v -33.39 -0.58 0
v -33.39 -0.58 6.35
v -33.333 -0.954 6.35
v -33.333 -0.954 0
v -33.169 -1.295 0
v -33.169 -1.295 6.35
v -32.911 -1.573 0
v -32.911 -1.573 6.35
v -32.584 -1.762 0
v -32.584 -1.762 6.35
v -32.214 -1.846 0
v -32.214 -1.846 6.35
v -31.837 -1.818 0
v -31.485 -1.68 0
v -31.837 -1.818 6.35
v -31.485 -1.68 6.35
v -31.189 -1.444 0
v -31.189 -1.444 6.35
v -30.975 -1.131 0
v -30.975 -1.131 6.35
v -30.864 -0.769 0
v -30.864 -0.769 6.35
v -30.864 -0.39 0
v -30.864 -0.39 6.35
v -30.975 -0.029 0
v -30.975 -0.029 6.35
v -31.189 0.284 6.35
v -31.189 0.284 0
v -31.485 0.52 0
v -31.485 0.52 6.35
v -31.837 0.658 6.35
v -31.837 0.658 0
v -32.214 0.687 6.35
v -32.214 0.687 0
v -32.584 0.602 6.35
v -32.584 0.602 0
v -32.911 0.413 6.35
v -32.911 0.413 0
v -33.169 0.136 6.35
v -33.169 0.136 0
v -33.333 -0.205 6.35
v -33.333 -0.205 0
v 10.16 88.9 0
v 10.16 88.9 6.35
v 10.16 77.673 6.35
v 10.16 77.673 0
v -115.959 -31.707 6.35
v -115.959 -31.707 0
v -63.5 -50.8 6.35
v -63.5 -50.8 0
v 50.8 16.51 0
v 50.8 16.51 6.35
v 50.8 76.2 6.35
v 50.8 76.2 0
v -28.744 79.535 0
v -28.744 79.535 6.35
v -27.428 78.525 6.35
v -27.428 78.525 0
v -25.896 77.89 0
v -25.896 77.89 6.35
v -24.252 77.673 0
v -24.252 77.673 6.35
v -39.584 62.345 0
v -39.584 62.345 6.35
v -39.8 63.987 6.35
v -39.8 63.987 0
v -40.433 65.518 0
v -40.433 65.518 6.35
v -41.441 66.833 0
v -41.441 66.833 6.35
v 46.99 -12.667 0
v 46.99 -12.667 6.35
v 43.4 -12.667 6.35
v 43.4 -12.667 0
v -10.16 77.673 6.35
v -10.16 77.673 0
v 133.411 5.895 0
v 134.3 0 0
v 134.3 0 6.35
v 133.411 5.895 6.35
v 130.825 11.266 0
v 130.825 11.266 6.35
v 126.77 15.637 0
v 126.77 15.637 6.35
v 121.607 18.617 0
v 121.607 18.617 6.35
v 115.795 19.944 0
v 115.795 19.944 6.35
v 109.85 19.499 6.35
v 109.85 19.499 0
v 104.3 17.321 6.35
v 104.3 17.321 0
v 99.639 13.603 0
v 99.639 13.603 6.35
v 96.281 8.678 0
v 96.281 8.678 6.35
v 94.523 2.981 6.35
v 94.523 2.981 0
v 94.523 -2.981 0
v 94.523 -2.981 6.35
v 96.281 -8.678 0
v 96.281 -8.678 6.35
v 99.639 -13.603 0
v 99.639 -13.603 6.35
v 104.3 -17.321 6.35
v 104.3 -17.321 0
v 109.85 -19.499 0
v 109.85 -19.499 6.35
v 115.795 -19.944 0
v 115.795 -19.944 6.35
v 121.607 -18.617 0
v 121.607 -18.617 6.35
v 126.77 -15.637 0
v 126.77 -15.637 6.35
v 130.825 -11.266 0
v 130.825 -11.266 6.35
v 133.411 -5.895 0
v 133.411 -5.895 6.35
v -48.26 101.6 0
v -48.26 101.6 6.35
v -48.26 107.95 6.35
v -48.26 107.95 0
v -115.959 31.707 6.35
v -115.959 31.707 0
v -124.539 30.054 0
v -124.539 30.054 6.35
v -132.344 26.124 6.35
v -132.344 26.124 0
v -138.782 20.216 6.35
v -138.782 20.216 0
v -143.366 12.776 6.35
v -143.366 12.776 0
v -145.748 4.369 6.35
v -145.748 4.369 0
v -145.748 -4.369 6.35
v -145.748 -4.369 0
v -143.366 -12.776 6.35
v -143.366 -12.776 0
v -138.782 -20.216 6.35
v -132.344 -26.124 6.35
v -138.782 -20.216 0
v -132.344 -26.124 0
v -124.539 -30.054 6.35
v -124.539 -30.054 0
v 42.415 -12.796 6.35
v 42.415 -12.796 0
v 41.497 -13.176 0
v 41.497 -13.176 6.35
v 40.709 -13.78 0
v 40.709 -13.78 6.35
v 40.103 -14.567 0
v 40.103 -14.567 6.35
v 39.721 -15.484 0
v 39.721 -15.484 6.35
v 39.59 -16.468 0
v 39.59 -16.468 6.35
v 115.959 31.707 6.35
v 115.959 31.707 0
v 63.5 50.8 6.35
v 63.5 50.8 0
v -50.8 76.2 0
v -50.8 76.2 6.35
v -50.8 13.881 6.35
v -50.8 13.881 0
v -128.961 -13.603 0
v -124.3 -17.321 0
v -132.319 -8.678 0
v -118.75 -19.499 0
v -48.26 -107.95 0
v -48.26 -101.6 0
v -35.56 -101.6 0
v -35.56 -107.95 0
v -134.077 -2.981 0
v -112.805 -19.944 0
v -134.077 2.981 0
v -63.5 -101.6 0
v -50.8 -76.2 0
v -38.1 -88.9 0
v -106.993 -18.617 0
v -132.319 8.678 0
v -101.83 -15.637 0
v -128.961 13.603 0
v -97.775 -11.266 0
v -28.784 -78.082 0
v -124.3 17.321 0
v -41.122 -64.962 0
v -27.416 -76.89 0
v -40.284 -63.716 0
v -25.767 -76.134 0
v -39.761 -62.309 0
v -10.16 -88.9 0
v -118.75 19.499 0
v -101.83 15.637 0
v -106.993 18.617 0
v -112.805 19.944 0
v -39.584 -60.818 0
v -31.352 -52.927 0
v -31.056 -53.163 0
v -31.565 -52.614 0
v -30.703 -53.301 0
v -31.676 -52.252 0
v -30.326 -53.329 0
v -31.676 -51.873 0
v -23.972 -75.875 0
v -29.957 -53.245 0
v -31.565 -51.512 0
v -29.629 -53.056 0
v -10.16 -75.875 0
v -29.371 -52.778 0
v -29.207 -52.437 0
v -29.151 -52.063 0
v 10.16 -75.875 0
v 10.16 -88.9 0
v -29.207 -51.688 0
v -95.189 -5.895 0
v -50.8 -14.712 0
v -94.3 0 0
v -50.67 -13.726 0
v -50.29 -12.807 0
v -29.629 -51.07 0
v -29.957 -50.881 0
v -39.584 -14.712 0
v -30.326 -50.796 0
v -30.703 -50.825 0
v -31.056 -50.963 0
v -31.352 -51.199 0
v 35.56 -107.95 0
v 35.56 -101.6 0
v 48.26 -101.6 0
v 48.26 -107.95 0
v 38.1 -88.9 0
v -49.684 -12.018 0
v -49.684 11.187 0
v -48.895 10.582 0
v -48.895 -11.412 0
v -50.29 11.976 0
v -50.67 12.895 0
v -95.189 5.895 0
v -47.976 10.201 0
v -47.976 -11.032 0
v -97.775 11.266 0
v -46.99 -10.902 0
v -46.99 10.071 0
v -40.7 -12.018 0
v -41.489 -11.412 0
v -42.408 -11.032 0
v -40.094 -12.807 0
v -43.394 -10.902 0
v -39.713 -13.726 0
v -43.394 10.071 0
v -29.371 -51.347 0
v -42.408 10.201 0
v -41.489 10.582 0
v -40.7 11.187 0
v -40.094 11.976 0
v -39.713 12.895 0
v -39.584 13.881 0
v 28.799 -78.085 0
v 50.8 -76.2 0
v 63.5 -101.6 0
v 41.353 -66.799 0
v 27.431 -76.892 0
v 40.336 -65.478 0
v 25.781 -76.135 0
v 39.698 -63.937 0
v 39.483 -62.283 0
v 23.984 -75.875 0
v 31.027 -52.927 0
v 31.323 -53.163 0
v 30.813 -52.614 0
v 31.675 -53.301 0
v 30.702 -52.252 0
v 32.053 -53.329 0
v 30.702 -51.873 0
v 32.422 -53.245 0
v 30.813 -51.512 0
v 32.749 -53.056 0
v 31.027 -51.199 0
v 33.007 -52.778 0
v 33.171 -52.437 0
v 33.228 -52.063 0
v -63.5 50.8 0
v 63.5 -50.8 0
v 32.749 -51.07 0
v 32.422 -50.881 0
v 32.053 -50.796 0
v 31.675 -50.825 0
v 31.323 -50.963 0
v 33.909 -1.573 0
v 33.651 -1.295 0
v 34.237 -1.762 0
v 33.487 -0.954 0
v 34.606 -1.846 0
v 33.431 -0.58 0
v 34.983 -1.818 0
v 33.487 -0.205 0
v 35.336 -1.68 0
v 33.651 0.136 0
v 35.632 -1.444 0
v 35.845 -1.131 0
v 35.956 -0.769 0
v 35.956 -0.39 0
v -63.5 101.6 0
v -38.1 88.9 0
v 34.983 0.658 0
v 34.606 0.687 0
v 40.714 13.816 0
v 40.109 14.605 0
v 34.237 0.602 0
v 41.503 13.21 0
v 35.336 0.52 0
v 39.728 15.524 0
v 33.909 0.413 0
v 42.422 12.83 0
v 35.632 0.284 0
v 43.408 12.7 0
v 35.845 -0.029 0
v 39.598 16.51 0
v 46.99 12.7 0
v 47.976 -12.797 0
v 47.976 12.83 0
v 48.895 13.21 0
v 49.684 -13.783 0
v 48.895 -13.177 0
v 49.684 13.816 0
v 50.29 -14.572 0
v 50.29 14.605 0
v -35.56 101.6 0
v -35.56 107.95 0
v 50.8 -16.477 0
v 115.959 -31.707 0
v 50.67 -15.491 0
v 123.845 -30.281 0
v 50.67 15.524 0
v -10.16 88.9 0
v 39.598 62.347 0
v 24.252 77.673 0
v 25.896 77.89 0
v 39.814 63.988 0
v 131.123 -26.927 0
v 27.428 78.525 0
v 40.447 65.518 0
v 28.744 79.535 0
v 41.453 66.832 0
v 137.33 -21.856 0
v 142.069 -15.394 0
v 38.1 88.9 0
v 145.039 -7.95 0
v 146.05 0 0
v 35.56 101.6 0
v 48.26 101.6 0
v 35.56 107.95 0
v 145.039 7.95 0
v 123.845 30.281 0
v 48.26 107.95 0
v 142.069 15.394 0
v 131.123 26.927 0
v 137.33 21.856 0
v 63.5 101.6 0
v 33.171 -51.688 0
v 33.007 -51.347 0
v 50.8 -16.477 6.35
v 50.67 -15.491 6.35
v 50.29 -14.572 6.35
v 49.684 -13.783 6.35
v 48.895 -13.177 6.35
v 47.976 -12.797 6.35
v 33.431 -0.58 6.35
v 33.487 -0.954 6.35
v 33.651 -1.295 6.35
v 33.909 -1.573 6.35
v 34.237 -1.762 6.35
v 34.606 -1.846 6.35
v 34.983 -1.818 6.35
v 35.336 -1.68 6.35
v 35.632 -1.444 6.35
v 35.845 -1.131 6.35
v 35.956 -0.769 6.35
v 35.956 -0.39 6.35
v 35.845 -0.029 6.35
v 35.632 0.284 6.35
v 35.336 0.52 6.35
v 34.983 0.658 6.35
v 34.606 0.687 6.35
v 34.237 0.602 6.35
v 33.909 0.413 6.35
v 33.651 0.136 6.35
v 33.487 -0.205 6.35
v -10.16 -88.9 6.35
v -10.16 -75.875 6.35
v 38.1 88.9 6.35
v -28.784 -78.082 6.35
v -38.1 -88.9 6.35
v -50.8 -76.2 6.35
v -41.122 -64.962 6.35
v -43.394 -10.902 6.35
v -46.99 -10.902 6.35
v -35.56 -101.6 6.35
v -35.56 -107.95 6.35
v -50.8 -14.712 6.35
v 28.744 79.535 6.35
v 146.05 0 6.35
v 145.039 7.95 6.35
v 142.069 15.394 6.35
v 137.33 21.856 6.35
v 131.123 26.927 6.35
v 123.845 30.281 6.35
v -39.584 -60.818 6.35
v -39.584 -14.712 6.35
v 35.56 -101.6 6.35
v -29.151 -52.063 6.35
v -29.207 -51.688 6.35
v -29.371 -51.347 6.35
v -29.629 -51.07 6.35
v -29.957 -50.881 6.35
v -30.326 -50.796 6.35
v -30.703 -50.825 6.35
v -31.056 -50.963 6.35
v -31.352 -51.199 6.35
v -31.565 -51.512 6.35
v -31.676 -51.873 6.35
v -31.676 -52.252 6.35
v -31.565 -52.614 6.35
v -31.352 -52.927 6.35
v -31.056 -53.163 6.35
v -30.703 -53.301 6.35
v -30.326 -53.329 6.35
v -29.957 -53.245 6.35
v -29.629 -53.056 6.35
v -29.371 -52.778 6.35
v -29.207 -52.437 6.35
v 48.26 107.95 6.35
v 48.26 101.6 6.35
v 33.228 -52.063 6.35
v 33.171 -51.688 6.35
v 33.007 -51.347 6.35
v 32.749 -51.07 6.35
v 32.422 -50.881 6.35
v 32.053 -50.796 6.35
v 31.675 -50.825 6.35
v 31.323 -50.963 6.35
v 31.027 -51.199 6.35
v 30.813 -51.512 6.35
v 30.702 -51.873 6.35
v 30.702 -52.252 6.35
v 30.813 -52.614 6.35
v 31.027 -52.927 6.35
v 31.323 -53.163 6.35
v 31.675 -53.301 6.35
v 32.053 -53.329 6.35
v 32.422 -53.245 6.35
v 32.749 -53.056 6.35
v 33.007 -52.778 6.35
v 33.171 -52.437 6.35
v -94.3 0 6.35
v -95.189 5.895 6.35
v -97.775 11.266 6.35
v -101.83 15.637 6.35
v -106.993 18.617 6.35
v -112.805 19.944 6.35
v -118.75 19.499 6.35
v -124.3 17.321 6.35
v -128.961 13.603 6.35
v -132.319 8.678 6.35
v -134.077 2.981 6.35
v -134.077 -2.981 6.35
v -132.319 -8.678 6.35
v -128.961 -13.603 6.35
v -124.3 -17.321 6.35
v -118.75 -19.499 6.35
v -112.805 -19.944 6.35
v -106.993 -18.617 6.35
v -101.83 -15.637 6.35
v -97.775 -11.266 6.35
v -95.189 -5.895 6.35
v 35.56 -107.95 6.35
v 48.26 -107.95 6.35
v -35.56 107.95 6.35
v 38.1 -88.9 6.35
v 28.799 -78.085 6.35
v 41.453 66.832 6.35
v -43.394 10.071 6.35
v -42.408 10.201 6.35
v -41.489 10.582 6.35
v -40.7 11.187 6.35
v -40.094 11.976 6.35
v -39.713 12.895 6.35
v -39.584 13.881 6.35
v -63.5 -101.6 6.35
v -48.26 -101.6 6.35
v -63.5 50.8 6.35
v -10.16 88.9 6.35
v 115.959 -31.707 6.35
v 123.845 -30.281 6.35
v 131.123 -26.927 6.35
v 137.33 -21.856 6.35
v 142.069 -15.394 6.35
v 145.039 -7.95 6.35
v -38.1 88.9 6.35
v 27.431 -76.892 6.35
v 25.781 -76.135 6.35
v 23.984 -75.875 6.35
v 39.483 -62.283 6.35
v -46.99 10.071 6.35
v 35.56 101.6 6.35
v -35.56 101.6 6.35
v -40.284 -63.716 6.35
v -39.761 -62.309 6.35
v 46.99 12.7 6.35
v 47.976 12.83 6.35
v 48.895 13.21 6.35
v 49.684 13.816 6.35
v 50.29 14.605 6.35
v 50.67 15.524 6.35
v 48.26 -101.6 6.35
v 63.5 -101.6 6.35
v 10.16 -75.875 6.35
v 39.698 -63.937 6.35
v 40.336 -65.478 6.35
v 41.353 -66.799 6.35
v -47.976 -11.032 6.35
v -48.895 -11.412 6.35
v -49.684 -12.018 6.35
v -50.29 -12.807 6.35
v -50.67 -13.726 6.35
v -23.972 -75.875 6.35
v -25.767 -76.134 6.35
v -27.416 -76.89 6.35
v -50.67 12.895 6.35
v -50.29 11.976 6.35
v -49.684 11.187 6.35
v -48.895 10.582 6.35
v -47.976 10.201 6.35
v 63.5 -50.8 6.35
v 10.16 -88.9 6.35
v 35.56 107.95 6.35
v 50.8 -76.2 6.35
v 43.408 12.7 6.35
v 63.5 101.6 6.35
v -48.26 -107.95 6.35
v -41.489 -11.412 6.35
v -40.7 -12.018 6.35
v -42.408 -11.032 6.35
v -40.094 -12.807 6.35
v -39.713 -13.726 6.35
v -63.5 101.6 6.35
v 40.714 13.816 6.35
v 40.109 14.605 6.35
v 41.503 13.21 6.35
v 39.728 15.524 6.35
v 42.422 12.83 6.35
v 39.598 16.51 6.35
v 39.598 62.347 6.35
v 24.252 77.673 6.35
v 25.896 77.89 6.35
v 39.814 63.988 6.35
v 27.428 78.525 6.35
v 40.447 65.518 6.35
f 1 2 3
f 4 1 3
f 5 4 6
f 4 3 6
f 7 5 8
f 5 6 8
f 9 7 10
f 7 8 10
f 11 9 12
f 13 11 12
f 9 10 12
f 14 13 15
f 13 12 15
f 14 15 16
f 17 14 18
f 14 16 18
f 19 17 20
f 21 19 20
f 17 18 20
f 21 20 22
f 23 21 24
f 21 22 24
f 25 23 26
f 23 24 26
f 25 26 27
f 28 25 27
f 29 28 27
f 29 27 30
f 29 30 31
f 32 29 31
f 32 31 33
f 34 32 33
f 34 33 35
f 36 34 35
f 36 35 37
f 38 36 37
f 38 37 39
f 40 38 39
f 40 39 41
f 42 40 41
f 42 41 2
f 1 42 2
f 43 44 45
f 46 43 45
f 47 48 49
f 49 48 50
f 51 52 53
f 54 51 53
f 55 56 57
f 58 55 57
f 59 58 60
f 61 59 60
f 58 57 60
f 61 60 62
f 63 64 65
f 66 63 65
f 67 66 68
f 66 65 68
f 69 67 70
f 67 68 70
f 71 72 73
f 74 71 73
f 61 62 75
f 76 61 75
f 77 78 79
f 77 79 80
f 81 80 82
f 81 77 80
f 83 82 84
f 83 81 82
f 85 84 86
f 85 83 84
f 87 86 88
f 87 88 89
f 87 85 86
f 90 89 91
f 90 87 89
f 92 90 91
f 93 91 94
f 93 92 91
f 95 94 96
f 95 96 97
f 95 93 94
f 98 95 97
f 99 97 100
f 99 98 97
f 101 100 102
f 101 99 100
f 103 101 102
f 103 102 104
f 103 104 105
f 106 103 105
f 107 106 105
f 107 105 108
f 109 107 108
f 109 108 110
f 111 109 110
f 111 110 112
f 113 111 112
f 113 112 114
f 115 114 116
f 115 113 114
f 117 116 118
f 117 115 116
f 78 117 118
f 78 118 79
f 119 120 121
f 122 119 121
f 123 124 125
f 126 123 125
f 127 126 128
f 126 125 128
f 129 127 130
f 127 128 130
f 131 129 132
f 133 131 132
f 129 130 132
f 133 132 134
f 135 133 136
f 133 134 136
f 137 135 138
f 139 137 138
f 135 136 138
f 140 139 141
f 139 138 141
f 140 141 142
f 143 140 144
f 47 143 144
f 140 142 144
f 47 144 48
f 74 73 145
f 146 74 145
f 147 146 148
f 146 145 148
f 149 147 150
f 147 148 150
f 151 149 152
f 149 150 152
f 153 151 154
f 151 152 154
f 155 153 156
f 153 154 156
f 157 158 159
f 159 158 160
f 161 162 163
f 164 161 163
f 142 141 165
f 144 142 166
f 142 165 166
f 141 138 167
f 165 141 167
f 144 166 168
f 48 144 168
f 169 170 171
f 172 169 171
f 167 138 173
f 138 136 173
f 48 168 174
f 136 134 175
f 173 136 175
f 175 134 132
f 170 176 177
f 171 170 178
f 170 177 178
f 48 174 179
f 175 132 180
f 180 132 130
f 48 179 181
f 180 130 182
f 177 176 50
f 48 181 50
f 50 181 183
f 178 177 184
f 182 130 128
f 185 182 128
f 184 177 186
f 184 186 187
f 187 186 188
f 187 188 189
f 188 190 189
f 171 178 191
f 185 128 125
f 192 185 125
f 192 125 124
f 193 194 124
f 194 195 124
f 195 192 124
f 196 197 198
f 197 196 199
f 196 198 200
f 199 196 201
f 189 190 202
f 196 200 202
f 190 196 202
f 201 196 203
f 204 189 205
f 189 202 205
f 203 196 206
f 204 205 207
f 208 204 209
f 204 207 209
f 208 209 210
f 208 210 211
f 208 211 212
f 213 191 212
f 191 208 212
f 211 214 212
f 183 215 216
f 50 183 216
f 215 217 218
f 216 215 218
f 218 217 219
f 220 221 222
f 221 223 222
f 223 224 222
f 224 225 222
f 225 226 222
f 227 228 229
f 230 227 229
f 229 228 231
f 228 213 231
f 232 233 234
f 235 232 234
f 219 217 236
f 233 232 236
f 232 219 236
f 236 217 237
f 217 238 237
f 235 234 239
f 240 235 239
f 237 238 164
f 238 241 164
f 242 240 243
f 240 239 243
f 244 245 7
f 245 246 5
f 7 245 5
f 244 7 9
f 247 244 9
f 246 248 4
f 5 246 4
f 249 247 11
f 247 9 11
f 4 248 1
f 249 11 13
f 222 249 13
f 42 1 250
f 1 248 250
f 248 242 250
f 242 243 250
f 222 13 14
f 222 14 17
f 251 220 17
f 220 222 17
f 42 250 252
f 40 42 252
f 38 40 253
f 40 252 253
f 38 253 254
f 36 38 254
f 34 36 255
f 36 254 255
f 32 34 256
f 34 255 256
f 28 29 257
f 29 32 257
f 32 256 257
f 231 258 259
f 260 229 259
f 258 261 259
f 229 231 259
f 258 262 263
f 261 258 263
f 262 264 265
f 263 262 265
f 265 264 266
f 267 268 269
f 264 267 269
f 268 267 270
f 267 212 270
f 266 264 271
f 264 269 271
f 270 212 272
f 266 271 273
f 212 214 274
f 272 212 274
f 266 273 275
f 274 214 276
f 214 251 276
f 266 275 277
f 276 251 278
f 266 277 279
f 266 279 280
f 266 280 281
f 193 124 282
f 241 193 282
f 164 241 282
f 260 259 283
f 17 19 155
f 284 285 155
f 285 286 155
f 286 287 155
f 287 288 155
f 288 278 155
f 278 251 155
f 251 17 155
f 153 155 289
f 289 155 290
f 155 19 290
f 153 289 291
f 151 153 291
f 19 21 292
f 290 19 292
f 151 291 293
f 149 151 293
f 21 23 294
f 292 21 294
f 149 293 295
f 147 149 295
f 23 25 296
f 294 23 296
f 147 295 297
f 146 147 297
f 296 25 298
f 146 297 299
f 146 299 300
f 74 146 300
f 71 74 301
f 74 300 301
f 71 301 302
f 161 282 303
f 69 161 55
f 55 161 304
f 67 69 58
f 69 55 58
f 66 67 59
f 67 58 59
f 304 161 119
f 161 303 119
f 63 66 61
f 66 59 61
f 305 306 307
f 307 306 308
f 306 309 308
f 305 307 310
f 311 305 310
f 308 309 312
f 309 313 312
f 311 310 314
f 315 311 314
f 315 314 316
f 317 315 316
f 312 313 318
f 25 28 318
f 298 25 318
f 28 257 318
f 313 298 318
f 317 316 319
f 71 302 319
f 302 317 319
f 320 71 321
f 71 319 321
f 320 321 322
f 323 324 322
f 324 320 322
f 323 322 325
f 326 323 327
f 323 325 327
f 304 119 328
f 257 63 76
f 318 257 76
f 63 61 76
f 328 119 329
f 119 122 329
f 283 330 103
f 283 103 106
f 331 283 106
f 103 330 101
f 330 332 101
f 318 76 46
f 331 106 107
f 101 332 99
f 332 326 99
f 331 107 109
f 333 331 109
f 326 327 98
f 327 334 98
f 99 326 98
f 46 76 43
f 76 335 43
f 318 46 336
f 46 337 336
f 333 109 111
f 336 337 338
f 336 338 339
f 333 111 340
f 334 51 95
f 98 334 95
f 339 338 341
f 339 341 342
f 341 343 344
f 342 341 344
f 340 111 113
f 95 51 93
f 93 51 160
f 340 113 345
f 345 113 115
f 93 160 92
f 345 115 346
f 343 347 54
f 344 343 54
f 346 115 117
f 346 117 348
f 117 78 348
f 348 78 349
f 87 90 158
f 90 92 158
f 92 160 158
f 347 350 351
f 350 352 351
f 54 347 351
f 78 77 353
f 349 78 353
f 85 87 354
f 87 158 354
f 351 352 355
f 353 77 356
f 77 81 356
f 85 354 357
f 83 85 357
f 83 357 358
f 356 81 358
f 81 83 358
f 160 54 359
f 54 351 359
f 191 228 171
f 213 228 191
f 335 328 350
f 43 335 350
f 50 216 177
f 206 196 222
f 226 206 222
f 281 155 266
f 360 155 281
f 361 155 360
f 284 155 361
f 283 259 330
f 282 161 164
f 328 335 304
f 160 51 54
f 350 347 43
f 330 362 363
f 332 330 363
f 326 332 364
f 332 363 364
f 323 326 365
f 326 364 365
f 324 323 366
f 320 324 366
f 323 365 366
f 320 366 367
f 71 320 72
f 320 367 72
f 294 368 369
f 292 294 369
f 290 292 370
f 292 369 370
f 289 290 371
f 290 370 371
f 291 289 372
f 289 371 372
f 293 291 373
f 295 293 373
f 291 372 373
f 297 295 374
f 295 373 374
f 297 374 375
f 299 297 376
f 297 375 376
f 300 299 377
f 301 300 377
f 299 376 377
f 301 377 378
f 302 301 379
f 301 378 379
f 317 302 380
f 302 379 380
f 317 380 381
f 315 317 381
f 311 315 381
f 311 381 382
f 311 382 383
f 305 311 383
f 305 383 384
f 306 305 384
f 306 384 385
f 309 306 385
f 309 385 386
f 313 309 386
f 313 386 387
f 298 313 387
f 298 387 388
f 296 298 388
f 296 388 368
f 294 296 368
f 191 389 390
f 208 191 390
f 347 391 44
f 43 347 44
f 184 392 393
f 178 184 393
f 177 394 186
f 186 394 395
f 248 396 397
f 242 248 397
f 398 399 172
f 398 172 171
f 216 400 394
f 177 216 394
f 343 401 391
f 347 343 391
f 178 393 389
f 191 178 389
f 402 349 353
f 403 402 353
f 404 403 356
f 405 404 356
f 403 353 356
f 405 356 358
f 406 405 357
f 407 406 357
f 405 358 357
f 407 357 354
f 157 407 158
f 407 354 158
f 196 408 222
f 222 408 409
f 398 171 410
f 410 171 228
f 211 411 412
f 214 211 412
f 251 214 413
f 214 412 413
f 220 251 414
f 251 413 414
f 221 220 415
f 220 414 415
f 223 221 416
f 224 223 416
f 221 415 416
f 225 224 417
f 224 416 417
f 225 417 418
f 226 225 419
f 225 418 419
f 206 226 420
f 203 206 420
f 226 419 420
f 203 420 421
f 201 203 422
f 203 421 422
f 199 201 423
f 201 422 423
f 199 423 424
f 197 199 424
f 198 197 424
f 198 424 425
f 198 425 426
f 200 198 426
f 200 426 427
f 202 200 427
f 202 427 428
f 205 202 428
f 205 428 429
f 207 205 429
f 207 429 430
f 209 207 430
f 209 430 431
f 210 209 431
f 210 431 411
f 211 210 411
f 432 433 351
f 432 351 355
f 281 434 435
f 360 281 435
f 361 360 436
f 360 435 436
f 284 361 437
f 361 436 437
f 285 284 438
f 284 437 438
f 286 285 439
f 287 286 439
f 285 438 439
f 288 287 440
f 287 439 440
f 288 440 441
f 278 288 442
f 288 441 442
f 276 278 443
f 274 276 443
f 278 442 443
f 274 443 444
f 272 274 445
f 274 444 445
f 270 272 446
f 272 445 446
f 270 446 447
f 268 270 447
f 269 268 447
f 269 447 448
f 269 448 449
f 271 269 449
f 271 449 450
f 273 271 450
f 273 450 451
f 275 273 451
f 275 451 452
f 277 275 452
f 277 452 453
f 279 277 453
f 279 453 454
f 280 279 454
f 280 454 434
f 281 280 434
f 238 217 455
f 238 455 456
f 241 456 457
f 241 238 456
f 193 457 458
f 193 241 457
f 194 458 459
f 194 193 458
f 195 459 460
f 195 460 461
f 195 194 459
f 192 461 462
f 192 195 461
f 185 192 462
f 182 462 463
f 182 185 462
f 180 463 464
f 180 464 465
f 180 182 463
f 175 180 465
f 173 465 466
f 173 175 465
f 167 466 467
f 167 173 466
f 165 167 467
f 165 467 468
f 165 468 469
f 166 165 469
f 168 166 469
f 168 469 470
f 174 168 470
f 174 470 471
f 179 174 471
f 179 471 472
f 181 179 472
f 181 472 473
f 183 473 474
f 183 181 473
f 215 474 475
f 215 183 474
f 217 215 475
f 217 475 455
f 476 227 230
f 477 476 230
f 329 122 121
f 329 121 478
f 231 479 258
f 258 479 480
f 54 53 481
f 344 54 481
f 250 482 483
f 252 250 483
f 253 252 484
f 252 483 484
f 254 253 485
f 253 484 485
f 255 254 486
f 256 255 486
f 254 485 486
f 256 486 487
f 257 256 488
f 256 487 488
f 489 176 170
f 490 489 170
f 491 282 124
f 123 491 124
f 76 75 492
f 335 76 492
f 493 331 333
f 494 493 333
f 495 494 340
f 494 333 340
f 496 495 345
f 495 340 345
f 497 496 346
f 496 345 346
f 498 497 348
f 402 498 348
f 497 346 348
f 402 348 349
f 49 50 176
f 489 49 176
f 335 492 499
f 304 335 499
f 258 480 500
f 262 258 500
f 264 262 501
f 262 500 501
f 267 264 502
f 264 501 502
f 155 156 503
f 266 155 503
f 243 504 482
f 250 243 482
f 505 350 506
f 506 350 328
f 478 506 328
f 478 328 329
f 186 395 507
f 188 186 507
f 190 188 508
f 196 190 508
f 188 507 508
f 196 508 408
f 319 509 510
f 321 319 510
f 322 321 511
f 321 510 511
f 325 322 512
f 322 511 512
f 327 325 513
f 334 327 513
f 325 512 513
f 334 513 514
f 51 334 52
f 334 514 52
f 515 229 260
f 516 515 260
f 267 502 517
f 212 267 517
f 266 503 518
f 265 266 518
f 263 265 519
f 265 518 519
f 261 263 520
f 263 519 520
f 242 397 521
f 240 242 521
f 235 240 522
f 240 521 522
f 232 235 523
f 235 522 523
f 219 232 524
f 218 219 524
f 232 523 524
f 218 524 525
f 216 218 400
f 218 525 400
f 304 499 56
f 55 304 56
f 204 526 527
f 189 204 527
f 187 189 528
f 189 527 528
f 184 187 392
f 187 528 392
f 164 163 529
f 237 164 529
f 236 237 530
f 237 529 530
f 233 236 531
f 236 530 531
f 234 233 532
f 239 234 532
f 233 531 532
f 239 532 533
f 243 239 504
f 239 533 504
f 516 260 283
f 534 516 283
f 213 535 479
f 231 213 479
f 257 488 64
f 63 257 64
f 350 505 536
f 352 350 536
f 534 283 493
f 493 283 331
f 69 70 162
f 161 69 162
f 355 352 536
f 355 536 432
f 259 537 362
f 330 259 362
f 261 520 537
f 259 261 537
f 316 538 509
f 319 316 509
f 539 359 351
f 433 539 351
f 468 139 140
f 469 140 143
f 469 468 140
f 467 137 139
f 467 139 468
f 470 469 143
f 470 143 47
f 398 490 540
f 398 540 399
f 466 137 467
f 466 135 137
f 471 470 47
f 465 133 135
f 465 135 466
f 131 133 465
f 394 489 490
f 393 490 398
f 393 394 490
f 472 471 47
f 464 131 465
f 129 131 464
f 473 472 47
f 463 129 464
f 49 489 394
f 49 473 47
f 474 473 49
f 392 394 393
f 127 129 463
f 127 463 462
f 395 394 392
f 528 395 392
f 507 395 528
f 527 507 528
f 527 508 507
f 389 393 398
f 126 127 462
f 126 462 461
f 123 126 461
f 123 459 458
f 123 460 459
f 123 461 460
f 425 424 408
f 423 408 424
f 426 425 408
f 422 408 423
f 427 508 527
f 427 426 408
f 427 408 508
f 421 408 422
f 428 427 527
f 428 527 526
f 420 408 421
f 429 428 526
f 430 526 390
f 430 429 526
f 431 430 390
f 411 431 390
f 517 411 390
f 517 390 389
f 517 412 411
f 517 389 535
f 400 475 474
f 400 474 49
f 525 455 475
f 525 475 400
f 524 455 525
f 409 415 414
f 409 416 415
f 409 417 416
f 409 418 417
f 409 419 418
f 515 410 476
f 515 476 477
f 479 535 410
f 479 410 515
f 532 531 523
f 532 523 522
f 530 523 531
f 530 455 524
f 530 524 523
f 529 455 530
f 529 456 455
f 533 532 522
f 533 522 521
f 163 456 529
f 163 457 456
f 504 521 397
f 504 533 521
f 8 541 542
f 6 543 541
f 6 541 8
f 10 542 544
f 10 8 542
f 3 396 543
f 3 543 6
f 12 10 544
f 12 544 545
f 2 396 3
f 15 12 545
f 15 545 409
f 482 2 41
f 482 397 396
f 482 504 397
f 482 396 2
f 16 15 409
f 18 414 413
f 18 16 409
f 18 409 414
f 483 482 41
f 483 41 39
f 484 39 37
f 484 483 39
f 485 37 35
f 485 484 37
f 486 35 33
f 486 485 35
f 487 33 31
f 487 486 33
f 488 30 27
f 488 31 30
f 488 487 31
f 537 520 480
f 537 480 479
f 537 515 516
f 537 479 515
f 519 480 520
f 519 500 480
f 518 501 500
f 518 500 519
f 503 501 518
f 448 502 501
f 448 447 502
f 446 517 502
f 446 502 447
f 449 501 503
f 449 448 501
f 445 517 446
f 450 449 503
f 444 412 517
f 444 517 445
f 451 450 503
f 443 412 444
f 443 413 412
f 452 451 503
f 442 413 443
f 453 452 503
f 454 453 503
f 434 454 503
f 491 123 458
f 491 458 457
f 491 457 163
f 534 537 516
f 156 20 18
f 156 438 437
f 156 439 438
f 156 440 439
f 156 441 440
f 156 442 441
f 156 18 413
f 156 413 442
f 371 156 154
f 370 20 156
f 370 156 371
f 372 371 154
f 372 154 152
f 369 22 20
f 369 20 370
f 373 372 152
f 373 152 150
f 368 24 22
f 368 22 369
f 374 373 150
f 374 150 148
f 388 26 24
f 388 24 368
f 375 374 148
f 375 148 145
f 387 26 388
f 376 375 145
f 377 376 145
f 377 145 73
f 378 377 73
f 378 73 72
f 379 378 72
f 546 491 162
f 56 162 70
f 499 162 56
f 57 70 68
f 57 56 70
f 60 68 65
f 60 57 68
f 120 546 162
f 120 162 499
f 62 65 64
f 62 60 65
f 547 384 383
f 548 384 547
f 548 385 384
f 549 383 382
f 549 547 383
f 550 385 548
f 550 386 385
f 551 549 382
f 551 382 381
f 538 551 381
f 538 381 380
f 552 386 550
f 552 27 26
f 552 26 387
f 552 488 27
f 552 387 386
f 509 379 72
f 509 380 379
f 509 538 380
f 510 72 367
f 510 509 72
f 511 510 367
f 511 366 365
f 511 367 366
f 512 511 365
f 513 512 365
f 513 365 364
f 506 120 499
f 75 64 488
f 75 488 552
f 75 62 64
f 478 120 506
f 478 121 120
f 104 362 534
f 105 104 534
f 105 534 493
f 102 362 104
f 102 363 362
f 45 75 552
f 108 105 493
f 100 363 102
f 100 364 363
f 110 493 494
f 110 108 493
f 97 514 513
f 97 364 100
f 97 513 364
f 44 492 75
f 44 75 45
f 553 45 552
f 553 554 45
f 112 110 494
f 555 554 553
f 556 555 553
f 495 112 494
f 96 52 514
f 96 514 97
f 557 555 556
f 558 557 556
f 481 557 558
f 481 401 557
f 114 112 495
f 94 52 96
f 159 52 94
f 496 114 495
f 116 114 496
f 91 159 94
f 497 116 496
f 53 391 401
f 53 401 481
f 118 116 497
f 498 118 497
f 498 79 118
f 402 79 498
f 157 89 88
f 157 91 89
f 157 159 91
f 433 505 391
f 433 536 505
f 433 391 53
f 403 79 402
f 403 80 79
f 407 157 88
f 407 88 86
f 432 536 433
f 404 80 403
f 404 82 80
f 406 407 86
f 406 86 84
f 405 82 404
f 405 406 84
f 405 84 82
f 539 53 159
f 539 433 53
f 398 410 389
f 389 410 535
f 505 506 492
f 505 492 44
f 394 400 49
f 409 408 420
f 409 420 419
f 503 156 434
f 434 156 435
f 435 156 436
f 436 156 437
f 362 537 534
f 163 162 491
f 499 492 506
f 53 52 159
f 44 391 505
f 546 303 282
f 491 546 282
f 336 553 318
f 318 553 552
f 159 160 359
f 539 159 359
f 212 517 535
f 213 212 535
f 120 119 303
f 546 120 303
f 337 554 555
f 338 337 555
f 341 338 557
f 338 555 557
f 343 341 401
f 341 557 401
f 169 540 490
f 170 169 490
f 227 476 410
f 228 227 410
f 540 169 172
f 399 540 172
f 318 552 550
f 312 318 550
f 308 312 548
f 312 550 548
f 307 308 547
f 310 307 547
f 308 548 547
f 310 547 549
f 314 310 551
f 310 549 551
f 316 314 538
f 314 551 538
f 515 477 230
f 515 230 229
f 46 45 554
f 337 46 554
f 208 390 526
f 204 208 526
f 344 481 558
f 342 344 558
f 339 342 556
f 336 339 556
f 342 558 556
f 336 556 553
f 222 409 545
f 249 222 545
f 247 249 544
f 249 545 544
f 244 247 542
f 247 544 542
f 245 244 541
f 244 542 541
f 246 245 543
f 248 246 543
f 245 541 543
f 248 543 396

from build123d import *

# Parameters (mm, degrees)
F0_W     = 12.7
F0_H     = 6.35
F0_R     = 20
F1_DEPTH = 6.35
F3_DEPTH = 25.4
F4_R     = 1.27
F5_DEPTH = 25.4


with BuildPart() as f1:
    # F0 (on Top) → F1 (new body)
    with BuildSketch(Plane.XY):
        Polygon((-48.26, 101.6), (-63.5, 101.6), (-63.5, 50.8), (-63.5, -50.8), (-63.5, -101.6), (-48.26, -101.6), (-35.56, -101.6), (35.56, -101.6), (48.26, -101.6), (63.5, -101.6), (63.5, -50.8), (63.5, 50.8), (63.5, 101.6), (48.26, 101.6), (35.56, 101.6), (-35.56, 101.6), align=None)
        with Locations((-41.91, 104.775)):
            Rectangle(F0_W, F0_H)
        with BuildLine():
            Line((-63.5, -50.8), (-63.5, 50.8))
            Line((-63.5, 50.8), (-115.958545, 31.706651))
            ThreePointArc((-115.958545, 31.706651), (-92.443608, 23.02956), (-82.55, 0))
            ThreePointArc((-82.55, 0), (-92.443608, -23.02956), (-115.958545, -31.706651))
            Line((-115.958545, -31.706651), (-63.5, -50.8))
        make_face()
        with BuildLine():
            ThreePointArc((-82.55, 0), (-92.443608, 23.02956), (-115.958545, 31.706651))
            ThreePointArc((-115.958545, 31.706651), (-146.05, 0), (-115.958545, -31.706651))
            ThreePointArc((-115.958545, -31.706651), (-92.443608, -23.02956), (-82.55, 0))
        make_face()
        with Locations((-114.3, 0)):
            Circle(F0_R, mode=Mode.SUBTRACT)
        with Locations((41.91, 104.775)):
            Rectangle(F0_W, F0_H)
        with Locations((-41.91, -104.775)):
            Rectangle(F0_W, F0_H)
        with BuildLine():
            Line((115.958545, 31.706651), (63.5, 50.8))
            Line((63.5, 50.8), (63.5, -50.8))
            Line((63.5, -50.8), (115.958545, -31.706651))
            ThreePointArc((115.958545, -31.706651), (82.55, 0), (115.958545, 31.706651))
        make_face()
        with Locations((41.91, -104.775)):
            Rectangle(F0_W, F0_H)
        with BuildLine():
            ThreePointArc((146.05, 0), (137.32956, 21.856392), (115.958545, 31.706651))
            ThreePointArc((115.958545, 31.706651), (82.55, 0), (115.958545, -31.706651))
            ThreePointArc((115.958545, -31.706651), (137.32956, -21.856392), (146.05, 0))
        make_face()
        with Locations((114.3, 0)):
            Circle(F0_R, mode=Mode.SUBTRACT)
    extrude(amount=F1_DEPTH)

    # F2 (on face) → F3 (cut)
    with BuildSketch(Plane.XY.offset(6.35)):
        with BuildLine():
            ThreePointArc((-28.743891, 79.535165), (-26.683078, 78.157131), (-24.251671, 77.6732))
            Line((-24.251671, 77.6732), (-10.16, 77.6732))
            Line((-10.16, 77.6732), (-10.16, 88.9))
            Line((-10.16, 88.9), (-38.1, 88.9))
            Line((-38.1, 88.9), (-28.743891, 79.535165))
        make_face()
        with BuildLine():
            Line((-10.16, -75.875254), (-23.971951, -75.875254))
            ThreePointArc((-23.971951, -75.875254), (-26.61868, -76.453137), (-28.783676, -78.081608))
            Line((-28.783676, -78.081608), (-38.1, -88.9))
            Line((-38.1, -88.9), (-10.16, -88.9))
            Line((-10.16, -88.9), (-10.16, -75.875254))
        make_face()
        with BuildLine():
            Line((23.98423, -75.875254), (10.16, -75.875254))
            Line((10.16, -75.875254), (10.16, -88.9))
            Line((10.16, -88.9), (38.1, -88.9))
            Line((38.1, -88.9), (28.798656, -78.084747))
            ThreePointArc((28.798656, -78.084747), (26.632841, -76.454001), (23.98423, -75.875254))
        make_face()
        with BuildLine():
            Line((41.353395, -66.799067), (50.8, -76.2))
            Line((50.8, -76.2), (50.8, -16.477037))
            ThreePointArc((50.8, -16.477037), (49.684077, -13.78296), (46.99, -12.667037))
            Line((46.99, -12.667037), (43.399565, -12.667037))
            ThreePointArc((43.399565, -12.667037), (40.708633, -13.779818), (39.589575, -16.468145))
            Line((39.589575, -16.468145), (39.482647, -62.283251))
            ThreePointArc((39.482647, -62.283251), (39.966103, -64.728373), (41.353395, -66.799067))
        make_face()
        with BuildLine():
            Line((-50.8, -14.712054), (-50.8, -76.2))
            Line((-50.8, -76.2), (-41.121936, -64.961544))
            ThreePointArc((-41.121936, -64.961544), (-39.980638, -63.027881), (-39.583661, -60.817898))
            Line((-39.583661, -60.817898), (-39.583661, -14.712054))
            ThreePointArc((-39.583661, -14.712054), (-40.699584, -12.017977), (-43.393661, -10.902054))
            Line((-43.393661, -10.902054), (-46.99, -10.902054))
            ThreePointArc((-46.99, -10.902054), (-49.684077, -12.017977), (-50.8, -14.712054))
        make_face()
        with BuildLine():
            Line((50.8, 16.51), (50.8, 76.2))
            Line((50.8, 76.2), (41.453267, 66.832201))
            ThreePointArc((41.453267, 66.832201), (40.080445, 64.773868), (39.598446, 62.34713))
            Line((39.598446, 62.34713), (39.598446, 16.51))
            ThreePointArc((39.598446, 16.51), (40.714369, 13.815923), (43.408446, 12.7))
            Line((43.408446, 12.7), (46.99, 12.7))
            ThreePointArc((46.99, 12.7), (49.684077, 13.815923), (50.8, 16.51))
        make_face()
        with BuildLine():
            Line((10.16, 88.9), (10.16, 77.6732))
            Line((10.16, 77.6732), (24.251671, 77.6732))
            ThreePointArc((24.251671, 77.6732), (26.683078, 78.157131), (28.743891, 79.535165))
            Line((28.743891, 79.535165), (38.1, 88.9))
            Line((38.1, 88.9), (10.16, 88.9))
        make_face()
        with BuildLine():
            Line((-41.44144, 66.832712), (-50.8, 76.2))
            Line((-50.8, 76.2), (-50.8, 13.881477))
            ThreePointArc((-50.8, 13.881477), (-49.684077, 11.187401), (-46.99, 10.071477))
            Line((-46.99, 10.071477), (-43.393661, 10.071477))
            ThreePointArc((-43.393661, 10.071477), (-40.699584, 11.187401), (-39.583661, 13.881477))
            Line((-39.583661, 13.881477), (-39.583661, 62.344677))
            ThreePointArc((-39.583661, 62.344677), (-40.066459, 64.77335), (-41.44144, 66.832712))
        make_face()
    extrude(amount=-F3_DEPTH, mode=Mode.SUBTRACT)

    # F4 (on face) → F5 (cut)
    with BuildSketch(Plane.XY.offset(6.35)):
        with BuildLine():
            ThreePointArc((30.687634, -52.062728), (31.957634, -53.332728), (33.227634, -52.062728))
            ThreePointArc((33.227634, -52.062728), (31.957634, -50.792728), (30.687634, -52.062728))
        make_face()
        with Locations((-30.42054, -52.062728)):
            Circle(F4_R)
        with BuildLine():
            ThreePointArc((-30.849525, -0.579722), (-32.119525, 0.690278), (-33.389525, -0.579722))
            Line((-33.389525, -0.579722), (-30.849525, -0.579722))
        make_face()
        with BuildLine():
            ThreePointArc((35.97056, -0.579722), (34.70056, 0.690278), (33.43056, -0.579722))
            Line((33.43056, -0.579722), (35.97056, -0.579722))
        make_face()
        with BuildLine():
            Line((35.97056, -0.579722), (33.43056, -0.579722))
            ThreePointArc((33.43056, -0.579722), (34.70056, -1.849722), (35.97056, -0.579722))
        make_face()
        with BuildLine():
            Line((-30.849525, -0.579722), (-33.389525, -0.579722))
            ThreePointArc((-33.389525, -0.579722), (-32.119525, -1.849722), (-30.849525, -0.579722))
        make_face()
    extrude(amount=-F5_DEPTH, mode=Mode.SUBTRACT)


solid = f1.part
